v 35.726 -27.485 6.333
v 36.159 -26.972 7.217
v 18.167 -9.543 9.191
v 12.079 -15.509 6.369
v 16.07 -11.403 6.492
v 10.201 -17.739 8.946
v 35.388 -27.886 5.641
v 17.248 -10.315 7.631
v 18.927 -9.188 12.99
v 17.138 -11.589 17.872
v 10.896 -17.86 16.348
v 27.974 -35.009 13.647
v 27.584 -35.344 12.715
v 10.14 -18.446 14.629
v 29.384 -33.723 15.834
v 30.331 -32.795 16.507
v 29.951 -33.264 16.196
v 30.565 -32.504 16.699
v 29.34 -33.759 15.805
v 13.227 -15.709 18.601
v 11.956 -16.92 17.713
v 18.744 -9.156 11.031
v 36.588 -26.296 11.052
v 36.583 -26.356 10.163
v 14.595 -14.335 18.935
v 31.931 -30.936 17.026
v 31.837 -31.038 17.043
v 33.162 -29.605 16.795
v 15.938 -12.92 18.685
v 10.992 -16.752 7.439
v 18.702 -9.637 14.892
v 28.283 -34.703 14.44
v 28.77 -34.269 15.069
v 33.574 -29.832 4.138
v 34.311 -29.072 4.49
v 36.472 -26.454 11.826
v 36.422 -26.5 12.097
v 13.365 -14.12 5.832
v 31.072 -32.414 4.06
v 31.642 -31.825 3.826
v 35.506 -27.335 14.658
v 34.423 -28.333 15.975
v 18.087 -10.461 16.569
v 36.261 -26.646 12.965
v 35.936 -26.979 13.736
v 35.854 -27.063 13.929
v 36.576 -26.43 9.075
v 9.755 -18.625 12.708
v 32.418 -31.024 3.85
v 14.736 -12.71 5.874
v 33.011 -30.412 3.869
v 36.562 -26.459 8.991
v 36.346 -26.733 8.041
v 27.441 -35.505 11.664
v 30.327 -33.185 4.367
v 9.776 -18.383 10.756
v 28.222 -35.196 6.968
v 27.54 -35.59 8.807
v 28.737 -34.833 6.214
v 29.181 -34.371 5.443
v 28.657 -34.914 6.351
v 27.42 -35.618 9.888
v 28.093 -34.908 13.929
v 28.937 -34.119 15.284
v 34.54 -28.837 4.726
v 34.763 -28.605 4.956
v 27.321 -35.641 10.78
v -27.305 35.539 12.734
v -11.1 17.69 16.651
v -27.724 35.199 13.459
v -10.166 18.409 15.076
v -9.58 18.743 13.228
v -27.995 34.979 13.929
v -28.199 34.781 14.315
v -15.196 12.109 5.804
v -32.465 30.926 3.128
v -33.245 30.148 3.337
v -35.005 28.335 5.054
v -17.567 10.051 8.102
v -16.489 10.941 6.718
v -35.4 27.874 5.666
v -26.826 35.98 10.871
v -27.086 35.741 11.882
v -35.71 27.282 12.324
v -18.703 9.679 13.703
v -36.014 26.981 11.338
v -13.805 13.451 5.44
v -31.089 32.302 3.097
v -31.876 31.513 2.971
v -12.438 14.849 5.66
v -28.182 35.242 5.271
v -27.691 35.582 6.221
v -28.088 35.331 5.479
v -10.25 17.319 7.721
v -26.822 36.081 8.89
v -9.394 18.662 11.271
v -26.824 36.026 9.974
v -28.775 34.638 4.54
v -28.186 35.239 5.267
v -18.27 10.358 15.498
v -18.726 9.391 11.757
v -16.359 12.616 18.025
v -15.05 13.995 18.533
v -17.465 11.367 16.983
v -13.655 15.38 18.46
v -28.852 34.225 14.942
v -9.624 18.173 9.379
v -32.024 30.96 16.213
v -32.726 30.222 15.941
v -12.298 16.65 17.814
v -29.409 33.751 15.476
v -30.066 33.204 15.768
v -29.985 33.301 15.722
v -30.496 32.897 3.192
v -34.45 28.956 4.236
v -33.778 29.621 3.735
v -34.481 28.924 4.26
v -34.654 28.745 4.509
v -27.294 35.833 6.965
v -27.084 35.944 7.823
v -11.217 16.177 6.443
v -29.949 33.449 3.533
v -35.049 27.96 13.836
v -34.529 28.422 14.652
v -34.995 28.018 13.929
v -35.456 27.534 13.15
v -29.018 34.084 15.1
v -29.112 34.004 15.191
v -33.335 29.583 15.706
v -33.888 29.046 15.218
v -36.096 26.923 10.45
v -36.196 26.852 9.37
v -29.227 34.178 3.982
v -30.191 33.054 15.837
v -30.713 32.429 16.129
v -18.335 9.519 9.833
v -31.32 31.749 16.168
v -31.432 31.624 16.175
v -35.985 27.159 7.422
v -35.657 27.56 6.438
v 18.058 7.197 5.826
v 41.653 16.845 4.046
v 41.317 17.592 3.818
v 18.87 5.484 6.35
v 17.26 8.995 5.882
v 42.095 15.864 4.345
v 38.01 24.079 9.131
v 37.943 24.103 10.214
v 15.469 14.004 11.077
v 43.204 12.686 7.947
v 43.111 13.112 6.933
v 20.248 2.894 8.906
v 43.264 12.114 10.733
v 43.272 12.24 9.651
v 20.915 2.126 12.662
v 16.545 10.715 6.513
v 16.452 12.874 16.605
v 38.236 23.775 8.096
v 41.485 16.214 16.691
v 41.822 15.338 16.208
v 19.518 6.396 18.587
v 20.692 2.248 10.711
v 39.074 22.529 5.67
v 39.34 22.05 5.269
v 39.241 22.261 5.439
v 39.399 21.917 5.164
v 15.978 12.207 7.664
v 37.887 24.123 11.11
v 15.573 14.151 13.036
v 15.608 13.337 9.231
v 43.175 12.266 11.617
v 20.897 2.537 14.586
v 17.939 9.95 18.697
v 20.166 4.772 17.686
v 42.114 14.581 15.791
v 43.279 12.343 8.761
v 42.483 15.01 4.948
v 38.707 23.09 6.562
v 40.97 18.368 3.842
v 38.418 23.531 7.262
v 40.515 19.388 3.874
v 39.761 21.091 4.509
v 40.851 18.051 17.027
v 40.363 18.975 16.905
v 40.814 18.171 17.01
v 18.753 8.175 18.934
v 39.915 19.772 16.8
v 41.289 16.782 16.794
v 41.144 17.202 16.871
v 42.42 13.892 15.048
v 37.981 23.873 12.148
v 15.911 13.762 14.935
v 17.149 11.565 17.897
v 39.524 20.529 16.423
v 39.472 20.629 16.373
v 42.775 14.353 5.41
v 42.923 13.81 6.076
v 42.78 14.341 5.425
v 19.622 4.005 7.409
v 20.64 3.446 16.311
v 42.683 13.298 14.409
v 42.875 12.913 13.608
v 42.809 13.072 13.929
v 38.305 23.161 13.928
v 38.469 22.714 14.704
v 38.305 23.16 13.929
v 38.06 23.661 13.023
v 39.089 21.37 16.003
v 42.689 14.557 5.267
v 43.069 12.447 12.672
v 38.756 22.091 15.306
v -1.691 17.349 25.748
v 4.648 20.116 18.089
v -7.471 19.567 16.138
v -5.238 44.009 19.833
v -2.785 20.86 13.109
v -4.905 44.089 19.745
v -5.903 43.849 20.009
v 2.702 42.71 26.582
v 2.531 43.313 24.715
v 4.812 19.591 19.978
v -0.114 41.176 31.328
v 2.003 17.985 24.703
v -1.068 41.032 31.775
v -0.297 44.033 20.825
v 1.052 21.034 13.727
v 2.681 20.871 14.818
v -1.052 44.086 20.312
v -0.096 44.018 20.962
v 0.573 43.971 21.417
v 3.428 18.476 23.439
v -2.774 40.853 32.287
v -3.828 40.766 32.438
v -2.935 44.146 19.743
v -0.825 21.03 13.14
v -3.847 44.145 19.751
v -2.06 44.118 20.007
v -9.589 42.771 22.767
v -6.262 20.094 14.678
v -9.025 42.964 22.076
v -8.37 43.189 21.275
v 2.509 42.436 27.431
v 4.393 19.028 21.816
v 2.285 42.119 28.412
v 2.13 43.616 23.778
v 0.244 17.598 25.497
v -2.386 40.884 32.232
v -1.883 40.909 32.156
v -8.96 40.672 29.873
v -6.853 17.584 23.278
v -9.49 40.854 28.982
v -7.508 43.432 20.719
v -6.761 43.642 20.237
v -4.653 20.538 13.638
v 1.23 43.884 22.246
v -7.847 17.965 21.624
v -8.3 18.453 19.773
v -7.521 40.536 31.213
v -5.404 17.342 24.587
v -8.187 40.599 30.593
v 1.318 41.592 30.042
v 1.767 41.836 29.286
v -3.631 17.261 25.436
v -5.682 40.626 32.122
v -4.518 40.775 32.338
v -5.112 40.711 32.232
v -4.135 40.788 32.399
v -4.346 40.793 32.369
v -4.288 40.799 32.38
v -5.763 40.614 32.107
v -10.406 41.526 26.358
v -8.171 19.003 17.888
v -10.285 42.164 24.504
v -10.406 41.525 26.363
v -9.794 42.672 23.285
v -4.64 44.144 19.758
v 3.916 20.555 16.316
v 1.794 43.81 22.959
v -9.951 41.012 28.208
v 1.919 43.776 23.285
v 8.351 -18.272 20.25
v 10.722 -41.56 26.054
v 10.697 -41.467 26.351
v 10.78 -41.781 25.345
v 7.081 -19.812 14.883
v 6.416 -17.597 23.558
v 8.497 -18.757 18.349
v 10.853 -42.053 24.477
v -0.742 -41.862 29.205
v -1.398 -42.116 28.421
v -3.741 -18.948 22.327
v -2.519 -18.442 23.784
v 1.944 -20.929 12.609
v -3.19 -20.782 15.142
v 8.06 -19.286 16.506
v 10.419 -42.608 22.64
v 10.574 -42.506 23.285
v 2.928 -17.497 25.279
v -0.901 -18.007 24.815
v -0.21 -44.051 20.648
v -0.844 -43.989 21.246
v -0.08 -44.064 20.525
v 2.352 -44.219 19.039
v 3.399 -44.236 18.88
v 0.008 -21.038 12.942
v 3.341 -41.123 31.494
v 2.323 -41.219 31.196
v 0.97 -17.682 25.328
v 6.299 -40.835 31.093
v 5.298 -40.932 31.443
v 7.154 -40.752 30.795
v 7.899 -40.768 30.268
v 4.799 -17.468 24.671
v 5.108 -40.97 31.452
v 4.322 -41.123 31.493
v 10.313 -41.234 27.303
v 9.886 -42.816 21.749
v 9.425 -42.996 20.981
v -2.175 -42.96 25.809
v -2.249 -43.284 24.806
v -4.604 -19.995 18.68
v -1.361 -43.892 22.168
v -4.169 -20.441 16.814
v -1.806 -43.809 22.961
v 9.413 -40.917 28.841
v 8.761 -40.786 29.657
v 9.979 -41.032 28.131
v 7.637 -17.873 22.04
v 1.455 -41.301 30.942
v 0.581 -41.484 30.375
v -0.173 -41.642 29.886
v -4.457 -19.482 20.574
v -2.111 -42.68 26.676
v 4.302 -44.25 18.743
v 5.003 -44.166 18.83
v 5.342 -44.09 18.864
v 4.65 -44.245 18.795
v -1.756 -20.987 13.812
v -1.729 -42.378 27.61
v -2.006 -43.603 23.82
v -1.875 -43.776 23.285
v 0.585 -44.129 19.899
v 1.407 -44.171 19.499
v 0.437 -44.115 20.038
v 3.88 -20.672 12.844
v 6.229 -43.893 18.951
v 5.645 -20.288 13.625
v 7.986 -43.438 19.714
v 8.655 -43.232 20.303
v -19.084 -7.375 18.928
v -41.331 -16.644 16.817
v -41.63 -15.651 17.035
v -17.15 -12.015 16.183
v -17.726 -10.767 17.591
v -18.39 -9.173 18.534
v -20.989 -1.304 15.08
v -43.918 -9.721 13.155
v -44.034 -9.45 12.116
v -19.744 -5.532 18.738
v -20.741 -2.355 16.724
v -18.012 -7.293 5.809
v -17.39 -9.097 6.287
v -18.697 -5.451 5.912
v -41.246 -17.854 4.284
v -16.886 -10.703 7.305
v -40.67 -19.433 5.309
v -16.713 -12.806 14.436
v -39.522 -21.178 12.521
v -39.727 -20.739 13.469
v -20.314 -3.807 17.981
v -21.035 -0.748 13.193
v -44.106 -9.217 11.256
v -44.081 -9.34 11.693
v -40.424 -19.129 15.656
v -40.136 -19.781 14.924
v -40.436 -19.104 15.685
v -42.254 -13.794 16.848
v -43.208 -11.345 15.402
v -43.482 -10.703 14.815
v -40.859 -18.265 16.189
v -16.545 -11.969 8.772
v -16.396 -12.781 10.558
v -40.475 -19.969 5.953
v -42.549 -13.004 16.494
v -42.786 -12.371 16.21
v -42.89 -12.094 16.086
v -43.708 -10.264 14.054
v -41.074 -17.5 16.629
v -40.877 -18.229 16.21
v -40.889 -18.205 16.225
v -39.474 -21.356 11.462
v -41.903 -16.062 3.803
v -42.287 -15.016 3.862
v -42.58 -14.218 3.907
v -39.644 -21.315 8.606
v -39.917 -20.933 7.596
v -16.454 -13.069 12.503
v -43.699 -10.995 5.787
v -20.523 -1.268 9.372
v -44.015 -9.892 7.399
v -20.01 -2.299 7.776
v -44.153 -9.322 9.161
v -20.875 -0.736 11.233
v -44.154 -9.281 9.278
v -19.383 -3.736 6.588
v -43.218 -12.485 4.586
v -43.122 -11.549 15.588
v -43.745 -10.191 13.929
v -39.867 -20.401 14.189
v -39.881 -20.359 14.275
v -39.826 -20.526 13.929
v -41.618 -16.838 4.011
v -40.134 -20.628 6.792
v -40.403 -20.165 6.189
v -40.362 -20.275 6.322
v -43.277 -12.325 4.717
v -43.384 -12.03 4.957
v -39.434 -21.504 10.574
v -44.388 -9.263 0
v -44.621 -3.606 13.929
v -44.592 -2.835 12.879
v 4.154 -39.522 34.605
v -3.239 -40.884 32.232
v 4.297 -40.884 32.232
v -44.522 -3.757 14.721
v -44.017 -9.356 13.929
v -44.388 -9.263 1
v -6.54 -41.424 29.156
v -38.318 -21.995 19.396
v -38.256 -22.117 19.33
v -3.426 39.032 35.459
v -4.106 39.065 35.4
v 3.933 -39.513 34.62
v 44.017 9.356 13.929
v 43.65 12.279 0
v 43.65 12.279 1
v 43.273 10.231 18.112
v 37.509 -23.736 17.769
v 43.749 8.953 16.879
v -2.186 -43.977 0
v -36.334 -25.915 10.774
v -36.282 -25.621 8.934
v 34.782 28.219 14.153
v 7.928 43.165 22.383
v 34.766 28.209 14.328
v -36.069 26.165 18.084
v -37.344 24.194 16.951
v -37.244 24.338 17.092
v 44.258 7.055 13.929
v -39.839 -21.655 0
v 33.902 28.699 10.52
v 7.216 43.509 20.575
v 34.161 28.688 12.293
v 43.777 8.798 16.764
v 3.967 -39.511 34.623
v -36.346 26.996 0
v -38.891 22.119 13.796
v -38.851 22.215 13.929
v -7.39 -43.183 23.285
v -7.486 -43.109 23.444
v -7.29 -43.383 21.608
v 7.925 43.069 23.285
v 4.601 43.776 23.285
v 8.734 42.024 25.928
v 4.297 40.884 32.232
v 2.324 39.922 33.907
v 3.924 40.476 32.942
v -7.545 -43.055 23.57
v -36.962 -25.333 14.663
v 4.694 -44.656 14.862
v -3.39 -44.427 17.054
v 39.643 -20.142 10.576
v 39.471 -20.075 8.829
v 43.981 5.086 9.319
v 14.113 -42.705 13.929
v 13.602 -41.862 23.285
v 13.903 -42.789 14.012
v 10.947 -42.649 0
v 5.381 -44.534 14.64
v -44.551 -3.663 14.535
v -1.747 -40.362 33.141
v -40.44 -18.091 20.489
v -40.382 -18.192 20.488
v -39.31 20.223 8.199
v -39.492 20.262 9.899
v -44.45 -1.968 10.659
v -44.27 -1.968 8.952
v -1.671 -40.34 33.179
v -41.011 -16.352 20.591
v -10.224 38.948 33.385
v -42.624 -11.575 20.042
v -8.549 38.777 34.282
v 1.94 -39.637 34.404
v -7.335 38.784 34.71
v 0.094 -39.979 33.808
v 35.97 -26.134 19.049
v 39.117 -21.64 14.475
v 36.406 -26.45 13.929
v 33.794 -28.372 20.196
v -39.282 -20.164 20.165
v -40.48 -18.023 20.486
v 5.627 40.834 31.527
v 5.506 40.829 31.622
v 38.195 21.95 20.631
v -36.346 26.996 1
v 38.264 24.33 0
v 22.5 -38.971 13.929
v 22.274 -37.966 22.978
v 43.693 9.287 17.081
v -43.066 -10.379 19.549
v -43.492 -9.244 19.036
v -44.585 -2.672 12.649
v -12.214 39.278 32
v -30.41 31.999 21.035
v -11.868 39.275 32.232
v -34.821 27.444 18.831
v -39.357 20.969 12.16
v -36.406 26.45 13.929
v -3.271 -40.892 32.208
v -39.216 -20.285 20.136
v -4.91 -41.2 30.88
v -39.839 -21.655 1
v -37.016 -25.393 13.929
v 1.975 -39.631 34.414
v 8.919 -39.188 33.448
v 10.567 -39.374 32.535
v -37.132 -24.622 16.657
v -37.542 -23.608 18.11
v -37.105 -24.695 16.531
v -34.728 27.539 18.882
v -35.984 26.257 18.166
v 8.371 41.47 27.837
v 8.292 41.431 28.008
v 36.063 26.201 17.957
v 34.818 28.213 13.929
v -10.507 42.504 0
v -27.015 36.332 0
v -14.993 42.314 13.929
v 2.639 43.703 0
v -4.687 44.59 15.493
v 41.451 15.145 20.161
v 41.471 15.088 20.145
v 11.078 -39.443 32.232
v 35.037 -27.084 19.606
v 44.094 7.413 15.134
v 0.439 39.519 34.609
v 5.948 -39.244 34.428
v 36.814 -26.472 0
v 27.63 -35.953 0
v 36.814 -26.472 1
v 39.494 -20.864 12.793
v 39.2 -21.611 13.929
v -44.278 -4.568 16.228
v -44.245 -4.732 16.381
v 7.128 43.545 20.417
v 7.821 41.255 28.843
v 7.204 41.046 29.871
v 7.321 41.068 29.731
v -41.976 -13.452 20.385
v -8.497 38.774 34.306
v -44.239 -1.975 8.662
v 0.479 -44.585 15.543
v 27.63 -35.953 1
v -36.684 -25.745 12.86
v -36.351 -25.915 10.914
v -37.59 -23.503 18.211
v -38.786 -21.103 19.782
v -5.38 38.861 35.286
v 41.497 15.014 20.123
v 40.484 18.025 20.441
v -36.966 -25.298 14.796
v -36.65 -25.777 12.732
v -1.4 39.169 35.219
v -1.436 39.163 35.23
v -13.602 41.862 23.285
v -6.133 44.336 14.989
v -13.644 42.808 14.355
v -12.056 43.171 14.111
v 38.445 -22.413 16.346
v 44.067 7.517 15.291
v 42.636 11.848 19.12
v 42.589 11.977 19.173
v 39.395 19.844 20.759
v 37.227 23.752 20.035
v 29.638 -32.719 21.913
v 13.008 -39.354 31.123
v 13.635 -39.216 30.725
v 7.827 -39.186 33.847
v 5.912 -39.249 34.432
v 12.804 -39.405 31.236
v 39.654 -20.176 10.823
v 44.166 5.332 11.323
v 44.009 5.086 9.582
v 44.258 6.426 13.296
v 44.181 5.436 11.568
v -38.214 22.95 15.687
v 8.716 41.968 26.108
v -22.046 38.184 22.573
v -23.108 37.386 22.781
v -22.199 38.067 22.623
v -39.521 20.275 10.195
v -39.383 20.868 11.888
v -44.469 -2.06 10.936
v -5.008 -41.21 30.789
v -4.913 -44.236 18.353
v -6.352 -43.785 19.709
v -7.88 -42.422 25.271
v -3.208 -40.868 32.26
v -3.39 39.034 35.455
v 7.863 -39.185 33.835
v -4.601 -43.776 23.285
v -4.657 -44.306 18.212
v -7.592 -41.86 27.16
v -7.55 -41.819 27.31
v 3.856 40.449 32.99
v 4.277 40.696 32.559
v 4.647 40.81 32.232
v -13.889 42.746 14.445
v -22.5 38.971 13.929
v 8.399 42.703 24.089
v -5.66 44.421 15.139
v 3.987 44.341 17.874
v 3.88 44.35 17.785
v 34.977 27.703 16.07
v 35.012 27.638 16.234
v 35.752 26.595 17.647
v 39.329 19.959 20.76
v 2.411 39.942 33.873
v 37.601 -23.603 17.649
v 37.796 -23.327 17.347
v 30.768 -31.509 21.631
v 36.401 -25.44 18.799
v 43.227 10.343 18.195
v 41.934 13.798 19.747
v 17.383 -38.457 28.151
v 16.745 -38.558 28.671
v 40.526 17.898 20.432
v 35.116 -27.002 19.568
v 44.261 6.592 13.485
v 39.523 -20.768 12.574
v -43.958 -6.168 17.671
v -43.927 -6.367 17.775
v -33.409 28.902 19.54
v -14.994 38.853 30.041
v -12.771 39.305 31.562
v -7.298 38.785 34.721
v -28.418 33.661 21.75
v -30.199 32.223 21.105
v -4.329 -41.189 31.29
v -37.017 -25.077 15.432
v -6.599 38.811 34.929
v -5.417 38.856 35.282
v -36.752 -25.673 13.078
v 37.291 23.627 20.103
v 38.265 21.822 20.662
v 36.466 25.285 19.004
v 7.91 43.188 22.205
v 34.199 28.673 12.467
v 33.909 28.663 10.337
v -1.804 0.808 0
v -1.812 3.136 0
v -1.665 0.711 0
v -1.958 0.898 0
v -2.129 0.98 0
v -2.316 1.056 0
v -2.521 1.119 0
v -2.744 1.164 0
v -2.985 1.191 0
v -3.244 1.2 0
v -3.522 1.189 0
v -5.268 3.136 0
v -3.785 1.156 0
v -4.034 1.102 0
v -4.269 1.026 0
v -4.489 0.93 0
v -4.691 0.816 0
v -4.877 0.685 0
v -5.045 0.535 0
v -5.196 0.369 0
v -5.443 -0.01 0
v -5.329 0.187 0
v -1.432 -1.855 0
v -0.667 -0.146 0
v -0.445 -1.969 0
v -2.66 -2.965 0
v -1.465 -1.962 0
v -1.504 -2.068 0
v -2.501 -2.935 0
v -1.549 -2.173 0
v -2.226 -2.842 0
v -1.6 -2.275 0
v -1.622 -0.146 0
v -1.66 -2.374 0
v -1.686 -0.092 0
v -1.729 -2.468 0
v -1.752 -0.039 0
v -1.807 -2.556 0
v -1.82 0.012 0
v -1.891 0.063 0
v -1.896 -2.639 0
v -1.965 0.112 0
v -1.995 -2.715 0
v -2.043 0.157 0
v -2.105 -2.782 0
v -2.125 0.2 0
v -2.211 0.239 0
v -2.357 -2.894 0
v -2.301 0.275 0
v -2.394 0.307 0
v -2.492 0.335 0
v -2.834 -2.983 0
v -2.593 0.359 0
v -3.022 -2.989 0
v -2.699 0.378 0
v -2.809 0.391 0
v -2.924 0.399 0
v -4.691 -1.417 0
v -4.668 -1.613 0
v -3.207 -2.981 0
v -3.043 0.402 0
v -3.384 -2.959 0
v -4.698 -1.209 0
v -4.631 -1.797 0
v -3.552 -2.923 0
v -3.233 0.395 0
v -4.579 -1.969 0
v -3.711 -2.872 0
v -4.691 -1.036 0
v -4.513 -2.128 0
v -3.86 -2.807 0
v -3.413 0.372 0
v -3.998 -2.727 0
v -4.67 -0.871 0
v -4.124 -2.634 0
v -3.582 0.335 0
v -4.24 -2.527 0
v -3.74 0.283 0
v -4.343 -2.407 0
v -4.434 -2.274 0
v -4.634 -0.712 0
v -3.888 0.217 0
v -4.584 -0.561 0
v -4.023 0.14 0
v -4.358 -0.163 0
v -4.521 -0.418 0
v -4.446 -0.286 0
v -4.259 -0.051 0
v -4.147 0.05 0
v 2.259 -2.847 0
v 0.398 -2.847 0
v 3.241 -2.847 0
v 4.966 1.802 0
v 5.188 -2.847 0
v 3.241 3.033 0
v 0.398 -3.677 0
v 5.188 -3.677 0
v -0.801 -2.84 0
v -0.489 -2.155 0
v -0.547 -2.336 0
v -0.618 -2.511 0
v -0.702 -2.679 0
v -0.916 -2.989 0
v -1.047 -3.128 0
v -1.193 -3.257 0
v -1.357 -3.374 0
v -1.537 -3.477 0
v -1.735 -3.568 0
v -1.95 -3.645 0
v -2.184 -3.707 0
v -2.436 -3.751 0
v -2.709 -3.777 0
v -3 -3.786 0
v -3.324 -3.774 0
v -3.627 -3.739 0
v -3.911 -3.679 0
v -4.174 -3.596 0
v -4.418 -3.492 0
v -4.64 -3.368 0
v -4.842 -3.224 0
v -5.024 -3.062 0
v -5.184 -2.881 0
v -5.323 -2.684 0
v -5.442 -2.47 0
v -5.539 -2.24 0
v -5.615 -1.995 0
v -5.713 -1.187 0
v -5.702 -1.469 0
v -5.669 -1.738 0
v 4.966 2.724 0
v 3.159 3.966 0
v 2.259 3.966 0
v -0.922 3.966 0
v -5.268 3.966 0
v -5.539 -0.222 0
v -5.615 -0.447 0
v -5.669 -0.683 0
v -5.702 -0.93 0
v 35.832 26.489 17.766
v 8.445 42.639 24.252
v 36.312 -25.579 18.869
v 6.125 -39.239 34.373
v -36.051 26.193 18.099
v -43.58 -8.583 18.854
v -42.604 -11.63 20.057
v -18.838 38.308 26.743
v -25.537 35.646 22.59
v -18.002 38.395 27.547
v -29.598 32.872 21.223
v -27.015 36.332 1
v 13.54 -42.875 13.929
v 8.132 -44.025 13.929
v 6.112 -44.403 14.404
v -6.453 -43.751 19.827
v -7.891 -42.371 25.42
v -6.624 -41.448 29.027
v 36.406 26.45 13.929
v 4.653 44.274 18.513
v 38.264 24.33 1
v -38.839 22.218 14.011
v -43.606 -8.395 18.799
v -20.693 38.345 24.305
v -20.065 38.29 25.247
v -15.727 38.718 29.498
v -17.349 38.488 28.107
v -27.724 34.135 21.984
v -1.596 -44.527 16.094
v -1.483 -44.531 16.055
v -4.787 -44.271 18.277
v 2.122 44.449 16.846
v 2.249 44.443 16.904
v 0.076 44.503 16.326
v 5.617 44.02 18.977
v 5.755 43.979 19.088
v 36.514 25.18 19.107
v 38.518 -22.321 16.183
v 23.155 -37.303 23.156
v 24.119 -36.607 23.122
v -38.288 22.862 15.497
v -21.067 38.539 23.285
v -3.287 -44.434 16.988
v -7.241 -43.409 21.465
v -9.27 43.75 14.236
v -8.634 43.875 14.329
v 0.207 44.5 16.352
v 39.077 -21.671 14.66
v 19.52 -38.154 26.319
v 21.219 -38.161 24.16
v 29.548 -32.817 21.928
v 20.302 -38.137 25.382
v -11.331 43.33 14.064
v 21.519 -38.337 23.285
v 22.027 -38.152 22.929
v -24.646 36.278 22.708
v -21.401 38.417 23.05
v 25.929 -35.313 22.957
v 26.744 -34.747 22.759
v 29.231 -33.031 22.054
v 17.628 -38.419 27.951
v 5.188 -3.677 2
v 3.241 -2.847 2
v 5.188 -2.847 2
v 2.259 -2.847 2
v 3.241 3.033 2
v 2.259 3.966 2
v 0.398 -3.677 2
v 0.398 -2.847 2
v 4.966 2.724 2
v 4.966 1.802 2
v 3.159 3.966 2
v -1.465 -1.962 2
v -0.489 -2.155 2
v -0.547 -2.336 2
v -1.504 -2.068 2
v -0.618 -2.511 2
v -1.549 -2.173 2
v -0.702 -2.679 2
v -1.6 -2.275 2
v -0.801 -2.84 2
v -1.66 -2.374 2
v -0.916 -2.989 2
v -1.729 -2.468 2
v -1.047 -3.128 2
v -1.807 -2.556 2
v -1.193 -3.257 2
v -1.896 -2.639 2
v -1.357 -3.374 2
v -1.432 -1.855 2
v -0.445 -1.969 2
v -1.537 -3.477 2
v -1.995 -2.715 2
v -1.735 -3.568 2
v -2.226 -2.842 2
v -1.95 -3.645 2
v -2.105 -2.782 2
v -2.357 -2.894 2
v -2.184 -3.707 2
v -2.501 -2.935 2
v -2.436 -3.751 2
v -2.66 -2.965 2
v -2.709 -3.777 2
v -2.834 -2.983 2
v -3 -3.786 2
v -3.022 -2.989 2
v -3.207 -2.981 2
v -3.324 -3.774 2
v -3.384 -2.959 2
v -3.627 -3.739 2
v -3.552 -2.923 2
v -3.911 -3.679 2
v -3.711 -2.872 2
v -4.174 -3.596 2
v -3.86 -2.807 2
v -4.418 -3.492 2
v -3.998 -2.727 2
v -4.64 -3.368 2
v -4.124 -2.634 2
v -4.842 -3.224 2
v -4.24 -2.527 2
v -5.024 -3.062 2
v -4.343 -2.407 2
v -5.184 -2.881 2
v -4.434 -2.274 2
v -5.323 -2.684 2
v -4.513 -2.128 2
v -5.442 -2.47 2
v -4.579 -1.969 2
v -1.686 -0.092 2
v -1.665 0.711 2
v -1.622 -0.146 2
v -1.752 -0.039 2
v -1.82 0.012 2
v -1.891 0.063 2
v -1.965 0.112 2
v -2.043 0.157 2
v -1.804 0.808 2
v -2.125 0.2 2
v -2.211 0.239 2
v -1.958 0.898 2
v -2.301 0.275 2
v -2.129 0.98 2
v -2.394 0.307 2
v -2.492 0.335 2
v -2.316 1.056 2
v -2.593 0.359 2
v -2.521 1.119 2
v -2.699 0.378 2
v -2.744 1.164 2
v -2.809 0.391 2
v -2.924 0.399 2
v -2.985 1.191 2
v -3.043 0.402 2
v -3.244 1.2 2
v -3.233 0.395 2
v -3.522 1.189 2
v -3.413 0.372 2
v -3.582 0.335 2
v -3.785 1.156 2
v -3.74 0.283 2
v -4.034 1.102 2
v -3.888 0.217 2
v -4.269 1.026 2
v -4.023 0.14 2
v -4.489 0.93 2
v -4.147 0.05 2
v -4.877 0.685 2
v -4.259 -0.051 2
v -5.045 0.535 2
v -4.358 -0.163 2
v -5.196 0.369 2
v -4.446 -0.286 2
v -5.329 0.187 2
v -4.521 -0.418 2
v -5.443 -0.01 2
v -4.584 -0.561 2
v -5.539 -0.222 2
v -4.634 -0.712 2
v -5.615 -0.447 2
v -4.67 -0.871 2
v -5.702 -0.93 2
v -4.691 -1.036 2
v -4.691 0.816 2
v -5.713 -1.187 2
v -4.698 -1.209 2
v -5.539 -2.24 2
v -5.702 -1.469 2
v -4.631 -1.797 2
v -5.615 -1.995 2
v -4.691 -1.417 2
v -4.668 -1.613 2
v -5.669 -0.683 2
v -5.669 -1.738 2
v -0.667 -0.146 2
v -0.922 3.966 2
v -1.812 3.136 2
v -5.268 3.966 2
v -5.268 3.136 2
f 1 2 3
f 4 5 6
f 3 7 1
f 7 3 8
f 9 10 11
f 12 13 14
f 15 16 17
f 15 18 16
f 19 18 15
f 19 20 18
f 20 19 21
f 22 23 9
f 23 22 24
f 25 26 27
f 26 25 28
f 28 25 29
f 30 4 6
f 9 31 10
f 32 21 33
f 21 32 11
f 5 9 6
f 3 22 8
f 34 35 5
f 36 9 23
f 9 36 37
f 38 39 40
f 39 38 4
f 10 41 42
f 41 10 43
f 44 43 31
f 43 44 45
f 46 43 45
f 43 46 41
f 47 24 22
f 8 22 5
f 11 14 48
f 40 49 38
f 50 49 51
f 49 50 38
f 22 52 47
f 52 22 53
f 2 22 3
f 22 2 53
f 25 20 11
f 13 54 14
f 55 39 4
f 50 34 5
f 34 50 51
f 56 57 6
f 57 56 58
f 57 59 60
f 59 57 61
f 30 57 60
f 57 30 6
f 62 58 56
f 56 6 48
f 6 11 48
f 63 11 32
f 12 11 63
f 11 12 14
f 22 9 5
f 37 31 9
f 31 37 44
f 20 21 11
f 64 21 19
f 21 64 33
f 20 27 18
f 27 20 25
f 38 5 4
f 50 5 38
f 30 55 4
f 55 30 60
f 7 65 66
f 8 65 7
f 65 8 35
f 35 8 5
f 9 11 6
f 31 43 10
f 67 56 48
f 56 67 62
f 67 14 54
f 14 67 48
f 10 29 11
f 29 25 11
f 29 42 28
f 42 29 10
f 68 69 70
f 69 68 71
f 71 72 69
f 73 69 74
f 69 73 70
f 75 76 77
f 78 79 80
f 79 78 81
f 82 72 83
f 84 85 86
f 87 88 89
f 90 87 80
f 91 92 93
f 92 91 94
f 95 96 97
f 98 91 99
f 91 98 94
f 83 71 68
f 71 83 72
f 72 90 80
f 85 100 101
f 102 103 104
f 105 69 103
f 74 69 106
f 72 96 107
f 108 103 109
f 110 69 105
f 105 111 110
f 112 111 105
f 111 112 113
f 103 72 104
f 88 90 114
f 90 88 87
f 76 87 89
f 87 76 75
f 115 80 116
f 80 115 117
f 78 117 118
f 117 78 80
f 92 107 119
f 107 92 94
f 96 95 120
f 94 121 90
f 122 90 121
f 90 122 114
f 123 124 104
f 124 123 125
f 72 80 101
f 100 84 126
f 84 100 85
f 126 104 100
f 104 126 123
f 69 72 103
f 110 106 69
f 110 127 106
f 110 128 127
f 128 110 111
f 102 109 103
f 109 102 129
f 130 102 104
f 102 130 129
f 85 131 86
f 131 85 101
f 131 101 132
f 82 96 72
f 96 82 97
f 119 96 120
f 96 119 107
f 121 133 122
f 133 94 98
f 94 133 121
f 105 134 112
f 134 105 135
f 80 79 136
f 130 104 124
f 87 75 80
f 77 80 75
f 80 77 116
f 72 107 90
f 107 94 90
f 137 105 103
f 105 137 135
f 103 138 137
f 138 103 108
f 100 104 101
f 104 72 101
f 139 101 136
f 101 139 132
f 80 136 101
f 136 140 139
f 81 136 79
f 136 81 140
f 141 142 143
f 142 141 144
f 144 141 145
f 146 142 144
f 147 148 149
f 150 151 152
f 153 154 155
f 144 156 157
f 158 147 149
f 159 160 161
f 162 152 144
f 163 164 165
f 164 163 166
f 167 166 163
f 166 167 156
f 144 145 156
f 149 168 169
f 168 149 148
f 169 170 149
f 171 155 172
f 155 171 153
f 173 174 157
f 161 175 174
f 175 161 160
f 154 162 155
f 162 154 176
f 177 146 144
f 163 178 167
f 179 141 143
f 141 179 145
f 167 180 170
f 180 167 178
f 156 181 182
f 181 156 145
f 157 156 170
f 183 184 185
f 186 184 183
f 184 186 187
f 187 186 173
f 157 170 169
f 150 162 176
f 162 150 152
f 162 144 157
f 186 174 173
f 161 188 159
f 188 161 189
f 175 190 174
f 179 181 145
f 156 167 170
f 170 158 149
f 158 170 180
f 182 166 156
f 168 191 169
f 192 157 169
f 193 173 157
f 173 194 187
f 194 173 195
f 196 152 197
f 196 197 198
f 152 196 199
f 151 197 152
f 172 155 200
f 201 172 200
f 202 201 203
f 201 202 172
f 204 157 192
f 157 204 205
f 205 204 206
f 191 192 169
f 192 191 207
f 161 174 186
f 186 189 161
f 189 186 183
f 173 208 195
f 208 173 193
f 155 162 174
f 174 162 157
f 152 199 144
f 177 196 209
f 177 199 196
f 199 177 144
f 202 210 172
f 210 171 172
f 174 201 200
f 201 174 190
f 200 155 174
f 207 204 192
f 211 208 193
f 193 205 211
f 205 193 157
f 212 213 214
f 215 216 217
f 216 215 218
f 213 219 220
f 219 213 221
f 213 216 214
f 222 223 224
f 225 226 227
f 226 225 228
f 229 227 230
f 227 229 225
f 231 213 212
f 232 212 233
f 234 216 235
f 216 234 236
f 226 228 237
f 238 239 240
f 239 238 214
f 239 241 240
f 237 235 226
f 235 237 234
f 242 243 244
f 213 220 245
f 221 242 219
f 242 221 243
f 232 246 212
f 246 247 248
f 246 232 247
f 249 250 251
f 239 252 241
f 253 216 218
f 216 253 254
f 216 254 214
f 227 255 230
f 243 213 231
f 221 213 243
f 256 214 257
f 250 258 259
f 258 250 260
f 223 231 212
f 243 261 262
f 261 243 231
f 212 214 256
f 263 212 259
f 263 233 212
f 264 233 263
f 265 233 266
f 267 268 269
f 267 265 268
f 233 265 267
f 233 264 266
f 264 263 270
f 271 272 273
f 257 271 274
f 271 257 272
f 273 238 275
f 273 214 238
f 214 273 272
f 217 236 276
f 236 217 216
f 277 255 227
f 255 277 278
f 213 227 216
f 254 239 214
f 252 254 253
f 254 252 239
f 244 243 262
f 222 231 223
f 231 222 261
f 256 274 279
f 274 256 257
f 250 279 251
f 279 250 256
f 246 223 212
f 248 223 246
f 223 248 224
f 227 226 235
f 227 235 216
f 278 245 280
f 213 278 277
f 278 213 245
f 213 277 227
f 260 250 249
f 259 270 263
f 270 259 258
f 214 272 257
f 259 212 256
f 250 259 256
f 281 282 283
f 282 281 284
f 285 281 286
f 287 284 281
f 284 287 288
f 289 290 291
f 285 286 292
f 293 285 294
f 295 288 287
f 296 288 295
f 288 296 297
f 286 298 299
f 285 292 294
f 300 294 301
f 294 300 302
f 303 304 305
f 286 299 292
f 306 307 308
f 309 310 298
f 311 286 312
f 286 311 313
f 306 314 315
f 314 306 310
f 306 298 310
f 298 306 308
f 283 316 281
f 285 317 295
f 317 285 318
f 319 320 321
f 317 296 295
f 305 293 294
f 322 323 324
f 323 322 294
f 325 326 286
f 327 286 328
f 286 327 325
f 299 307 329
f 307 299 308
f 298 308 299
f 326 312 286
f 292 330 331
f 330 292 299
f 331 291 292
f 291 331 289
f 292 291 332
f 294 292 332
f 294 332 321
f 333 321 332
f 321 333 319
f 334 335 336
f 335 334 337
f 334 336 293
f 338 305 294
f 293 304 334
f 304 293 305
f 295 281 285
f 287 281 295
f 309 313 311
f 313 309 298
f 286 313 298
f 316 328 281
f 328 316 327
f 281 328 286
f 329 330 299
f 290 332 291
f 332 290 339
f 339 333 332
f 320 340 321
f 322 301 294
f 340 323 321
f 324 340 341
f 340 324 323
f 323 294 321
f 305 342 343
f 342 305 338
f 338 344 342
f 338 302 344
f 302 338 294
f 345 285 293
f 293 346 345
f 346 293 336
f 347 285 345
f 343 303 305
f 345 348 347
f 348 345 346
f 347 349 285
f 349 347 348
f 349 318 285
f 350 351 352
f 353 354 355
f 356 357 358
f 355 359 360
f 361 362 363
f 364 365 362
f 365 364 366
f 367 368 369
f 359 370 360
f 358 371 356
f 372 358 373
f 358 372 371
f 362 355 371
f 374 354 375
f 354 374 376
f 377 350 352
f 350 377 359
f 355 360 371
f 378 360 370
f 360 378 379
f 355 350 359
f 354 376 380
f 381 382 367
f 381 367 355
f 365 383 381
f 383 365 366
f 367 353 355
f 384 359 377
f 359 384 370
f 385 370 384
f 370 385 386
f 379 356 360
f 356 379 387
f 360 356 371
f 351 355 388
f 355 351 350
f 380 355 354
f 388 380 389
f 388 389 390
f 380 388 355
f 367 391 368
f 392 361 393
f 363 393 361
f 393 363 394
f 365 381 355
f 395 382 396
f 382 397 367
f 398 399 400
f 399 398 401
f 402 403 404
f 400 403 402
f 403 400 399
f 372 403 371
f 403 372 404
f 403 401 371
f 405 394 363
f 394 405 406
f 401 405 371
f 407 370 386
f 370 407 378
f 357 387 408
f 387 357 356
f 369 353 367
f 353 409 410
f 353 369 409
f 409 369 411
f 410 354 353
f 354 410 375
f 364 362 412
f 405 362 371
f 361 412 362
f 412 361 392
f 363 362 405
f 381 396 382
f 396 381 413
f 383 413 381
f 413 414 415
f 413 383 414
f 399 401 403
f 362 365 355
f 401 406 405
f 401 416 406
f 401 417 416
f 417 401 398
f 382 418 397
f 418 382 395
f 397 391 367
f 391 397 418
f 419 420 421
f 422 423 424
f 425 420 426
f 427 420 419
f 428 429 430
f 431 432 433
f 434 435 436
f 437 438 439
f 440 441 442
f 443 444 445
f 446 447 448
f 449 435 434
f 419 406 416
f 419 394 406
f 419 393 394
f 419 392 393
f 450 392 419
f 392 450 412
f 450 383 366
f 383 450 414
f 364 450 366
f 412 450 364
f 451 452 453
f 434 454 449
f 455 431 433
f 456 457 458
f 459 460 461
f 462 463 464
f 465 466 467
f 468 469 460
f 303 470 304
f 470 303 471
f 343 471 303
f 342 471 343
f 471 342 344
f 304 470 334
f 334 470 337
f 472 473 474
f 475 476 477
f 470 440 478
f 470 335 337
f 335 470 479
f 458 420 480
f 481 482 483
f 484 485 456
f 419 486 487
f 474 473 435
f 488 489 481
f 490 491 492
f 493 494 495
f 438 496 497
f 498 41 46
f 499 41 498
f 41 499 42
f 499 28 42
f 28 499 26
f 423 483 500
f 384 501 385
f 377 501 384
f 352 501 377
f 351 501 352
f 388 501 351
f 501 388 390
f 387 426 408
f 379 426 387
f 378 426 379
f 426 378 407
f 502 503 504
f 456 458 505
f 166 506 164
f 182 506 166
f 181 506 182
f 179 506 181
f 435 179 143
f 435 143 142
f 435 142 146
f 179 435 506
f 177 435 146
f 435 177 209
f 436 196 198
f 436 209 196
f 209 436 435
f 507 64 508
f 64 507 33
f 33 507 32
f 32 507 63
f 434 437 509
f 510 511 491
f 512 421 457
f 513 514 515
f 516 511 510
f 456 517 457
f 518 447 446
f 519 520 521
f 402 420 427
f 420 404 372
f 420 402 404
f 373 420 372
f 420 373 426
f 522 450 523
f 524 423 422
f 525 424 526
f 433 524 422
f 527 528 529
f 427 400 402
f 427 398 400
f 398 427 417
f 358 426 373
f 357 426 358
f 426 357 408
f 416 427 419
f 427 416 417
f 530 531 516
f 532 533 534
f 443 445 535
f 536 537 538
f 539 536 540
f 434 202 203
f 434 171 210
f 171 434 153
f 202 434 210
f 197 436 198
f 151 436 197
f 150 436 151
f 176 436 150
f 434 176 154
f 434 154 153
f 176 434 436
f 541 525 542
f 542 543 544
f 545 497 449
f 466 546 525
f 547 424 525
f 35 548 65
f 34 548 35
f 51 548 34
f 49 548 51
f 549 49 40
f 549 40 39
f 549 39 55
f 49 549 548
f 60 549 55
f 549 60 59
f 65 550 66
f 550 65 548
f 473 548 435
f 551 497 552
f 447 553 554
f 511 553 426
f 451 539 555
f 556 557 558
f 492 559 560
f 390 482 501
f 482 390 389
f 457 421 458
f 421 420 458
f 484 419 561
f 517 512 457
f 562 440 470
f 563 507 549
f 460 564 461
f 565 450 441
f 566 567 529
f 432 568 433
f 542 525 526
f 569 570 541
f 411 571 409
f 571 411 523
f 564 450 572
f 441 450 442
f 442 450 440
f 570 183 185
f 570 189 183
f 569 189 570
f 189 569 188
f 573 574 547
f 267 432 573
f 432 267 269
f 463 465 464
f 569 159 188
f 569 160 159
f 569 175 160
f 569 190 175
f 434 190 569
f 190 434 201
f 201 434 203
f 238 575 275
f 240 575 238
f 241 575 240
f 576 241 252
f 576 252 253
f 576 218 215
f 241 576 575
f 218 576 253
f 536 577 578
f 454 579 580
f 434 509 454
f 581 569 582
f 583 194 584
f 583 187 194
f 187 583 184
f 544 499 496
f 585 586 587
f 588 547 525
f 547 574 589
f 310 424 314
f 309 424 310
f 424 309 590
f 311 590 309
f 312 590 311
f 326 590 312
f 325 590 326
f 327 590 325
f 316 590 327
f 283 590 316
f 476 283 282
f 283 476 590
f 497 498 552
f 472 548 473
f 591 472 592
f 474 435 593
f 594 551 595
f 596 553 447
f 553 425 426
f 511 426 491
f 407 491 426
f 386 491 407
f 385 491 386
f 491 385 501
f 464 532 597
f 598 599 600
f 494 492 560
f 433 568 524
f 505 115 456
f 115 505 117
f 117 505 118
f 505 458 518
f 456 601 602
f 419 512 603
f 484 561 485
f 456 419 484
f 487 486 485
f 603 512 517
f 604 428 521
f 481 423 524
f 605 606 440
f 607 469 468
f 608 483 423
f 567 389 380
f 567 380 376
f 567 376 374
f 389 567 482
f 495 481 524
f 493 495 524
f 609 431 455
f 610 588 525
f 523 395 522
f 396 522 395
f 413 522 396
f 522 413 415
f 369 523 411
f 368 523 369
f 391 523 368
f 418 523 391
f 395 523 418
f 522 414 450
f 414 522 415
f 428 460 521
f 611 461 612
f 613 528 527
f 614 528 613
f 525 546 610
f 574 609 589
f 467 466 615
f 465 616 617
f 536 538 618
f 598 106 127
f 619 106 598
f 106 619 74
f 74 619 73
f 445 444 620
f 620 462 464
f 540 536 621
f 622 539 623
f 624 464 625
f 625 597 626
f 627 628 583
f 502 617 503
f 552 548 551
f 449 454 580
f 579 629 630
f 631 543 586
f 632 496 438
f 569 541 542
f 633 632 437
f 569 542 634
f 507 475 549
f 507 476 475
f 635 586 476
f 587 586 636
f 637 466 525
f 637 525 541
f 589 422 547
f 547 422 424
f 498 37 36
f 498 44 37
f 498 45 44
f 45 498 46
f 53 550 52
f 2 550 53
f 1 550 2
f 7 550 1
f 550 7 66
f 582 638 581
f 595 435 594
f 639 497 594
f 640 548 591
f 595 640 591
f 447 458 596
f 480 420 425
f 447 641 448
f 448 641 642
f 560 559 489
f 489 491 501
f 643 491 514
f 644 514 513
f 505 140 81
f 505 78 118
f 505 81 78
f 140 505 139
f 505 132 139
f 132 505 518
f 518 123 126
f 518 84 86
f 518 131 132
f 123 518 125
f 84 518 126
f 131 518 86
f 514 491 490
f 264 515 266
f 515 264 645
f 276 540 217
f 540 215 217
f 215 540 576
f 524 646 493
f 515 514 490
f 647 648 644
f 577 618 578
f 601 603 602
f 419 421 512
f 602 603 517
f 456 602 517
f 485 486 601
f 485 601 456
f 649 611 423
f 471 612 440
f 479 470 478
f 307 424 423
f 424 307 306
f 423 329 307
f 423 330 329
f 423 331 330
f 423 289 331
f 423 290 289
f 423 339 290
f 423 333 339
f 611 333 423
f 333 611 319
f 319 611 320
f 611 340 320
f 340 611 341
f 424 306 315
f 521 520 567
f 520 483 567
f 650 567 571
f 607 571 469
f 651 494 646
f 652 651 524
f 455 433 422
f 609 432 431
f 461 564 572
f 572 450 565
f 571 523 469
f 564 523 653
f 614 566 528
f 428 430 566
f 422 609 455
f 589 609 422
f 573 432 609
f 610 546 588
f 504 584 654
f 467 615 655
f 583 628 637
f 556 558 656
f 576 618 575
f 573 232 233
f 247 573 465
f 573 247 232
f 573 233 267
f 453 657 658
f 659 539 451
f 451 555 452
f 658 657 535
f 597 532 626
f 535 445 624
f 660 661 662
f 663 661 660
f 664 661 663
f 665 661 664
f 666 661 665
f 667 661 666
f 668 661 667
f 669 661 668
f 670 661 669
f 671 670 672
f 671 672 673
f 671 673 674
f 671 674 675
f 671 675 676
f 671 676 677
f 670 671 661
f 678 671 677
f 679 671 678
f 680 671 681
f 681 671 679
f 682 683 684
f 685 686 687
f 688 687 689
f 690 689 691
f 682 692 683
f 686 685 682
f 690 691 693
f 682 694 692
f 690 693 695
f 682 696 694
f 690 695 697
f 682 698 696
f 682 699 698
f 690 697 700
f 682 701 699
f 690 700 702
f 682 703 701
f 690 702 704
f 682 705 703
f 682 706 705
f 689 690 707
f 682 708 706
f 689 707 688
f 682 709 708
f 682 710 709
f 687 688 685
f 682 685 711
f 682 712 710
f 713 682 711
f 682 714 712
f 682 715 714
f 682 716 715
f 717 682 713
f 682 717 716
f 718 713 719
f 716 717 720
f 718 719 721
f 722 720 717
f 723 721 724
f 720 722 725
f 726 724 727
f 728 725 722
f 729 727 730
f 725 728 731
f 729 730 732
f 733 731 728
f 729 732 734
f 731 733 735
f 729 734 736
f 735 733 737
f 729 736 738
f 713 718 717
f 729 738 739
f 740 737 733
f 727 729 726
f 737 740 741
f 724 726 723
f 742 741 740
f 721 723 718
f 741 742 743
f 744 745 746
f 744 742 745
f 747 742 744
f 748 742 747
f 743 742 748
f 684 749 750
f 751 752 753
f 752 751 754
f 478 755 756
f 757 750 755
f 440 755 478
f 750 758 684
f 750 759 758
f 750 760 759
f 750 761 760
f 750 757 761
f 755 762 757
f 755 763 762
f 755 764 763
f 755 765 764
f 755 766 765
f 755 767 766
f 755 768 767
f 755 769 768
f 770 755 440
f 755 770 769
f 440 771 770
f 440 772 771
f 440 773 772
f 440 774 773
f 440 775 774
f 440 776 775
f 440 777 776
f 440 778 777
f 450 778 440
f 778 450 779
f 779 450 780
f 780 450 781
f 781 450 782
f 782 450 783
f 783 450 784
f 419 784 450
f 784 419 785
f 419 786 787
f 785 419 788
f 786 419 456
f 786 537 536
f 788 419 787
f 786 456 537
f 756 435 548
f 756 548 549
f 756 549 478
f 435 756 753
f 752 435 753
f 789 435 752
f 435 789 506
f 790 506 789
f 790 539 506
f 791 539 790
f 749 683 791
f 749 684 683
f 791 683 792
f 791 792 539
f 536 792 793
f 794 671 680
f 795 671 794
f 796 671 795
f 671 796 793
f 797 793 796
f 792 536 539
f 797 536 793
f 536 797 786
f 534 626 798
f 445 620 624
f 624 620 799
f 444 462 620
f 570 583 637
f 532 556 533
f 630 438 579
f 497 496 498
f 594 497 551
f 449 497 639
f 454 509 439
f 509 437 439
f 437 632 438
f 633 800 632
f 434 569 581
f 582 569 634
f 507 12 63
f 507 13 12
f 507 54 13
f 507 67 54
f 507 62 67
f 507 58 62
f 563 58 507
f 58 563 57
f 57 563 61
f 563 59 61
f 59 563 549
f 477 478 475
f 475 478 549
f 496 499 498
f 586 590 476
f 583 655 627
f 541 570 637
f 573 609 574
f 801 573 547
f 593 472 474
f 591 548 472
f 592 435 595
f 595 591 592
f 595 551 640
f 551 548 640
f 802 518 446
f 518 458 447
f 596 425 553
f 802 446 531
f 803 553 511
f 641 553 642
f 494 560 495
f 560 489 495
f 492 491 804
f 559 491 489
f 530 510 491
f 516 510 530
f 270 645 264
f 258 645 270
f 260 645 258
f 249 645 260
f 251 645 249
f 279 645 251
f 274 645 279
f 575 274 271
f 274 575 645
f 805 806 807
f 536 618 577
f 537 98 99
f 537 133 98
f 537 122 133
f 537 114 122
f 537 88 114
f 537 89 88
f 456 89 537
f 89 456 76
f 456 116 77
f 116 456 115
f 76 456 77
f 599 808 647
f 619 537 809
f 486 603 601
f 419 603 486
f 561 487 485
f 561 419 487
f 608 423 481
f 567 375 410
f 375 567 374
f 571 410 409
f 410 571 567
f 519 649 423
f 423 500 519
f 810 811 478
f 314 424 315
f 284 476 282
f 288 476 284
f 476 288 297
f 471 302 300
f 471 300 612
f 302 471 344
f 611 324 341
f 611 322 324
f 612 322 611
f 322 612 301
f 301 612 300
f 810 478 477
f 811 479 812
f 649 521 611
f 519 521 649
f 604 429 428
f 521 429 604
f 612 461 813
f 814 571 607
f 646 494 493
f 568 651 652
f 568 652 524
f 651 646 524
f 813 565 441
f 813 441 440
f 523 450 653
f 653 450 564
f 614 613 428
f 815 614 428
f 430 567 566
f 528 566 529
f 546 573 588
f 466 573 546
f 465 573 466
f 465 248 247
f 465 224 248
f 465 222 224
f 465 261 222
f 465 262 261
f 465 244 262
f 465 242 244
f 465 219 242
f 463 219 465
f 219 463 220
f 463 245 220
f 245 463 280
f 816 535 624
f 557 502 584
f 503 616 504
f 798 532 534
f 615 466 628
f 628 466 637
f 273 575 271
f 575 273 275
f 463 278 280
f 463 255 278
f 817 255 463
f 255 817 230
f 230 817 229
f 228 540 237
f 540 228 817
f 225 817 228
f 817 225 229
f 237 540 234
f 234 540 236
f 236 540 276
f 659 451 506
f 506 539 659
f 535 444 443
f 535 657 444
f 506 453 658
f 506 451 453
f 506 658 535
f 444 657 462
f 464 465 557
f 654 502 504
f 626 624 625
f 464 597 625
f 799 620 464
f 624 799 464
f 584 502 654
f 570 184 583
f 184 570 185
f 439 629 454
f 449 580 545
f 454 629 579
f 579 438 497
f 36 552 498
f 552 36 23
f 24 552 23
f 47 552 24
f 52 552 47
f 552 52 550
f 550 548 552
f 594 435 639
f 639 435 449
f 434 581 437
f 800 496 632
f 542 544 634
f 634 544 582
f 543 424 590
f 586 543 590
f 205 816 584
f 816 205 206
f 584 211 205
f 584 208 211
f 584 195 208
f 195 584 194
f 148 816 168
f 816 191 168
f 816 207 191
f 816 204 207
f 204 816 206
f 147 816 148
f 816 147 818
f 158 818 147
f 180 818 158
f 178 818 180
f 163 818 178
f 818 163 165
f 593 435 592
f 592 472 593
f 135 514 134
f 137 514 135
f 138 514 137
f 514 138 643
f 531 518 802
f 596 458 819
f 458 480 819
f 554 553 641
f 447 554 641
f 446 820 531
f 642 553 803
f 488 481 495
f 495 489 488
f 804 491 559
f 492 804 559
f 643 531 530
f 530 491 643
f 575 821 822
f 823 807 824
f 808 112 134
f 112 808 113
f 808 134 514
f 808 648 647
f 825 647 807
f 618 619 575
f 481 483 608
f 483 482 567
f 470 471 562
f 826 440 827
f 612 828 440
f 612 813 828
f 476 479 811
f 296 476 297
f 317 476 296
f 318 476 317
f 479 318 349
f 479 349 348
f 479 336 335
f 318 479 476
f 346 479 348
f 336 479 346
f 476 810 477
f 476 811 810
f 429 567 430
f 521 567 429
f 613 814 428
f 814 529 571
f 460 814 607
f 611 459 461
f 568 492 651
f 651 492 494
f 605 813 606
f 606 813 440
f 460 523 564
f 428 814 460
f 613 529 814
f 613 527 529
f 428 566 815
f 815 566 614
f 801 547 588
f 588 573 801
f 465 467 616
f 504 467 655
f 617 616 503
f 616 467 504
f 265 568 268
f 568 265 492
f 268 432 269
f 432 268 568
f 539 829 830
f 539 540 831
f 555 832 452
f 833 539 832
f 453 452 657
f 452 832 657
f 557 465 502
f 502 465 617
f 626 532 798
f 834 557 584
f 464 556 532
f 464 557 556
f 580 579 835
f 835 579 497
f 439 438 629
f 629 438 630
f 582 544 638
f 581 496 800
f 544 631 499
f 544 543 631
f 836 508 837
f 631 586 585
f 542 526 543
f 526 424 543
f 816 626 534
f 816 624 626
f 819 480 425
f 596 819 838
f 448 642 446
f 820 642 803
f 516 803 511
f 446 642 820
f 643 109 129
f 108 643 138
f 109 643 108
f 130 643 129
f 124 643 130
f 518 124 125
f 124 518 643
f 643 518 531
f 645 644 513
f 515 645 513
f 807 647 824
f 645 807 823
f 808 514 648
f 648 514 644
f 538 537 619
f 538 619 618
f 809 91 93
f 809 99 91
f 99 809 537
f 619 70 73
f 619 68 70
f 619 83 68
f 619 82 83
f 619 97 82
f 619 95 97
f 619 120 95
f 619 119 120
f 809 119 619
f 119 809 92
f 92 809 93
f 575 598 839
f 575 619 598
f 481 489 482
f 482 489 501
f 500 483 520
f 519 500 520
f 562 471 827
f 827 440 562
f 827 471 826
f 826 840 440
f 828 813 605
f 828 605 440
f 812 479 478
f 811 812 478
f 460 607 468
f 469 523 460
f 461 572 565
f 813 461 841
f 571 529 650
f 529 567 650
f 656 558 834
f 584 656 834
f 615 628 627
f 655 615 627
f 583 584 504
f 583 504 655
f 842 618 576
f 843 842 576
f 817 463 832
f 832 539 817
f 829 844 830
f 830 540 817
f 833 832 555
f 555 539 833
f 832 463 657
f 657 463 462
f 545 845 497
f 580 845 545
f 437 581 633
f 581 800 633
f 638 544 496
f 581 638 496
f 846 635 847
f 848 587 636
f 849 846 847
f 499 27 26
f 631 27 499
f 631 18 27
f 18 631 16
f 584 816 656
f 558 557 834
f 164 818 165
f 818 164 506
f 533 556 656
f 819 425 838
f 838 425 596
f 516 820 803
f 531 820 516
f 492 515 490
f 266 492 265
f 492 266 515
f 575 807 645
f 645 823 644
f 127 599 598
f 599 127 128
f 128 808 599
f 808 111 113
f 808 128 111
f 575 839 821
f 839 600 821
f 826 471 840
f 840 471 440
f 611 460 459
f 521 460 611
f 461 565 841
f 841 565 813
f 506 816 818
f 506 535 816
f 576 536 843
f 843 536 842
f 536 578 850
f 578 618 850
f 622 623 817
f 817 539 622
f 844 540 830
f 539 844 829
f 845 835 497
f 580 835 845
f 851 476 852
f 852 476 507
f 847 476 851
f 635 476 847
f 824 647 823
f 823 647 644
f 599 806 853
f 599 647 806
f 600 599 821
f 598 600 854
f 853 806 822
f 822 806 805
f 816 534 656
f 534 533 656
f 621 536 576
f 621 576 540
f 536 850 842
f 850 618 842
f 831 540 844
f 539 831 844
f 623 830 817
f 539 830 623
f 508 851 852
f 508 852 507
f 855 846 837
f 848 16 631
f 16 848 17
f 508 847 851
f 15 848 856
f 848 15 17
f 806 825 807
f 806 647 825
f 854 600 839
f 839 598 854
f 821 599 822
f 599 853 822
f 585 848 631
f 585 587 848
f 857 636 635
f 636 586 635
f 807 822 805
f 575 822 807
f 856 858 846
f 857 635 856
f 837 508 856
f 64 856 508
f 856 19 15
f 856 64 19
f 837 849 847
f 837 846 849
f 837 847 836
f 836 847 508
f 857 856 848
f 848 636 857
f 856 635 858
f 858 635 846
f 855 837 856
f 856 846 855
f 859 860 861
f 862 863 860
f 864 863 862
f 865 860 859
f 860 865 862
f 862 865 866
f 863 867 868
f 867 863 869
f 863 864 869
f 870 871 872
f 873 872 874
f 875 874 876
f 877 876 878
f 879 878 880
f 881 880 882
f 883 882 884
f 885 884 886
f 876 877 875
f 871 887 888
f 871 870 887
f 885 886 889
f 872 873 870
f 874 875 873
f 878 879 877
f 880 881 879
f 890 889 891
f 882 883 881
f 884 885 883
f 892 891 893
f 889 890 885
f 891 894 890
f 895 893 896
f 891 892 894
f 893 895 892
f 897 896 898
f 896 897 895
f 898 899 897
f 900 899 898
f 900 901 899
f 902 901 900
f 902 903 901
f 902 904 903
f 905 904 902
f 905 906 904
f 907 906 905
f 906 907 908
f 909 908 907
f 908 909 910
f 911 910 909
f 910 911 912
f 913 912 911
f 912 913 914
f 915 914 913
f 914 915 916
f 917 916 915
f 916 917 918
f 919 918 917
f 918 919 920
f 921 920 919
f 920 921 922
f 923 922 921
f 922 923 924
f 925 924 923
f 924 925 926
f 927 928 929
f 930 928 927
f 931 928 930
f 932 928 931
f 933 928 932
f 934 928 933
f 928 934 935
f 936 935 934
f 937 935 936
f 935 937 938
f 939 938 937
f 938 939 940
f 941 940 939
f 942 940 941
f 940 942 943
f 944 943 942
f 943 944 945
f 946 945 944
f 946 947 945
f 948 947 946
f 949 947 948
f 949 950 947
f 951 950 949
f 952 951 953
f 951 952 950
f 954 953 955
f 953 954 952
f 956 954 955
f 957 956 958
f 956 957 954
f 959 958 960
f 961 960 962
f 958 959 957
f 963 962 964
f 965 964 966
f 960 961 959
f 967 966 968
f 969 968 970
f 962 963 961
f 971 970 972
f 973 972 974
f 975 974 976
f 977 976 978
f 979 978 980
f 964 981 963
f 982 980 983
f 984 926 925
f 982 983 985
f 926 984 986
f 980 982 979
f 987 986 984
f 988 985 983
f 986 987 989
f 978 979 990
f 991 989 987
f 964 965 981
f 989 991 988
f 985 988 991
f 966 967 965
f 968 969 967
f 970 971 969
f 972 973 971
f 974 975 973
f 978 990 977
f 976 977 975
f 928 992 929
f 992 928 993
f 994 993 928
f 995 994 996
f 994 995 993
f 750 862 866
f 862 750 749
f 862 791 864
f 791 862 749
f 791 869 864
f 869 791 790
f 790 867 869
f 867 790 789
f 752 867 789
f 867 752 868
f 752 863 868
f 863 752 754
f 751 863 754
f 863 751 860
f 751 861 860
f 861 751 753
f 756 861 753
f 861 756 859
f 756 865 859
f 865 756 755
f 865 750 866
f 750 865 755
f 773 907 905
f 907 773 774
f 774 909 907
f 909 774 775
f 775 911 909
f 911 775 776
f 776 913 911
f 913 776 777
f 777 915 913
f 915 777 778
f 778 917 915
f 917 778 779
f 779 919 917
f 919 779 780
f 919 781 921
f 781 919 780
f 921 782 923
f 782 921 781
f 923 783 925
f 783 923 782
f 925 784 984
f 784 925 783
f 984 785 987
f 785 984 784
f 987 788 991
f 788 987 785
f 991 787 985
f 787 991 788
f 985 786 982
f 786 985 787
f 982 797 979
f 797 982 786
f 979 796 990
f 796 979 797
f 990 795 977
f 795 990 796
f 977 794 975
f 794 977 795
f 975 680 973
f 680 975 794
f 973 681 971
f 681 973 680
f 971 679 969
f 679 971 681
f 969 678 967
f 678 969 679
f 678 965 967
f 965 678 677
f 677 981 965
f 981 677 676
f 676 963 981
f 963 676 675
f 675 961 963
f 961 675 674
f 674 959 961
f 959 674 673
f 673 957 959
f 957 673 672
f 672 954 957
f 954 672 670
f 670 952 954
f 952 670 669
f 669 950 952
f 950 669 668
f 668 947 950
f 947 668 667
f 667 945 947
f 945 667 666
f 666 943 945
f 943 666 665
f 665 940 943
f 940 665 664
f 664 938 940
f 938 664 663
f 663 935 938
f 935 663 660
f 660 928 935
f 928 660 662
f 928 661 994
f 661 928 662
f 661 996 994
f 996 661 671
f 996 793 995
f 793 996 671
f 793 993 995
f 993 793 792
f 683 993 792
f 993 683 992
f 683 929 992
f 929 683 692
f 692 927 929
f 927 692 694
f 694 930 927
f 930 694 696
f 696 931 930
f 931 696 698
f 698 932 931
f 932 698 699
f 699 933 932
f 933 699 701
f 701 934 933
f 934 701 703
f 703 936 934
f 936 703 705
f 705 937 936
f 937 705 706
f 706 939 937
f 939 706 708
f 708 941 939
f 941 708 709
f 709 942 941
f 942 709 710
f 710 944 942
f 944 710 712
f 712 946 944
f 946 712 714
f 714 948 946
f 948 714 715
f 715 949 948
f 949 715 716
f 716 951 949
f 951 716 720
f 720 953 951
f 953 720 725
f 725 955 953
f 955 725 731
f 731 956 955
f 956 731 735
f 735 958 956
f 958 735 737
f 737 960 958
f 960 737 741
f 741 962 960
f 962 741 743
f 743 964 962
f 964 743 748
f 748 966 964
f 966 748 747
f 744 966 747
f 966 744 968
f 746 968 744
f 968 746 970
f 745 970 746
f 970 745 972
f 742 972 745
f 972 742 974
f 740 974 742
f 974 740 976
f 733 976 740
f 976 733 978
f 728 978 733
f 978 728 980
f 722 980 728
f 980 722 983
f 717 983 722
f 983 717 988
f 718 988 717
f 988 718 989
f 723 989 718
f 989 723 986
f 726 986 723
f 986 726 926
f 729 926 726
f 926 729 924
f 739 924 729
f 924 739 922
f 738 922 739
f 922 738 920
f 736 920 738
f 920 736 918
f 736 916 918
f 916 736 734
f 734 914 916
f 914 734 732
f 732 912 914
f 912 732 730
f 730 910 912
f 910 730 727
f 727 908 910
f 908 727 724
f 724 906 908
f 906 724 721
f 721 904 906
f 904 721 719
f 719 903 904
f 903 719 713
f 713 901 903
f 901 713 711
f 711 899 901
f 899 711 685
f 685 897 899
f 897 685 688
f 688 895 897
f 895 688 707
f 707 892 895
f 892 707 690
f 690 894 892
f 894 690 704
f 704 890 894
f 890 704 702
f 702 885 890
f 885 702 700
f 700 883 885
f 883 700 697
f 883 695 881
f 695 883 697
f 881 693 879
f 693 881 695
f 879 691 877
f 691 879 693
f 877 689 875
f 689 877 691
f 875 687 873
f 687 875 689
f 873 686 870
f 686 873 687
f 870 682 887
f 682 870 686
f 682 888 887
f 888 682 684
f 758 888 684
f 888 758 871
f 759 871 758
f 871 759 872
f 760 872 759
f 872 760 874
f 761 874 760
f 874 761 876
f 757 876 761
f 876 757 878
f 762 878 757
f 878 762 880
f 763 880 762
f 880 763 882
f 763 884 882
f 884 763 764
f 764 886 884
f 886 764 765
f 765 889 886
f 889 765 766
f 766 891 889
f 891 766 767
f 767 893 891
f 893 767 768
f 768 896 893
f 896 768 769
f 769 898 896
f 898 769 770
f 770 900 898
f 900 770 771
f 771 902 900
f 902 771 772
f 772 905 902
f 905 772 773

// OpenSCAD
difference() {
	difference() {
		difference() {
			hull() {
				union() {
					union() {
						rotate(a = -44.0885568165, v = [0, 0, 1]) {
							translate(v = [0, -6.6000000000, 0]) {
								cube(size = [44.8608913384, 13.2000000000, 1]);
							}
						}
						rotate(a = 135.0152083052, v = [0, 0, 1]) {
							translate(v = [0, -6.6000000000, 0]) {
								cube(size = [44.7913225372, 13.2000000000, 1]);
							}
						}
						rotate(a = 24.0809680797, v = [0, 0, 1]) {
							translate(v = [0, -6.6000000000, 0]) {
								cube(size = [44.8608917975, 13.2000000000, 1]);
							}
						}
						rotate(a = 95.2146620758, v = [0, 0, 1]) {
							translate(v = [0, -6.6000000000, 0]) {
								cube(size = [43.2827500793, 13.2000000000, 1]);
							}
						}
						rotate(a = -84.2254760666, v = [0, 0, 1]) {
							translate(v = [0, -6.6000000000, 0]) {
								cube(size = [43.5340646969, 13.2000000000, 1]);
							}
						}
						rotate(a = -159.8428584581, v = [0, 0, 1]) {
							translate(v = [0, -6.6000000000, 0]) {
								cube(size = [44.8608908767, 13.2000000000, 1]);
							}
						}
					}
					translate(v = [0, 0, 13.9286747818]) {
						intersection() {
							hull() {
								rotate(a = 94.5063018240, v = [0.6936184448, 0.7160449746, -0.0000014097]) {
									cylinder(h = 45, r = 9.6000000000);
								}
								rotate(a = 95.5199751218, v = [-0.7036409821, -0.7040144307, 0.0000014077]) {
									cylinder(h = 45, r = 9.6000000000);
								}
								rotate(a = 94.5062199855, v = [-0.4067659687, 0.9101475830, -0.0000005034]) {
									cylinder(h = 45, r = 9.6000000000);
								}
								rotate(a = 74.1203690177, v = [-0.9578577323, -0.0874193342, 0.0000010453]) {
									cylinder(h = 45, r = 9.6000000000);
								}
								rotate(a = 75.3352946970, v = [0.9625147646, 0.0973360357, -0.0000010599]) {
									cylinder(h = 45, r = 9.6000000000);
								}
								rotate(a = 94.5063841252, v = [0.3435307565, -0.9358489979, 0.0000005923]) {
									cylinder(h = 45, r = 9.6000000000);
								}
							}
							sphere(r = 45);
						}
					}
				}
			}
			translate(v = [0, 0, 13.9286747818]) {
				rotate(a = 94.5063018240, v = [0.6936184448, 0.7160449746, -0.0000014097]) {
					translate(v = [0, 0, 20]) {
						cylinder(h = 45, r = 6.6000000000);
					}
				}
				rotate(a = 95.5199751218, v = [-0.7036409821, -0.7040144307, 0.0000014077]) {
					translate(v = [0, 0, 20]) {
						cylinder(h = 45, r = 6.6000000000);
					}
				}
				rotate(a = 94.5062199855, v = [-0.4067659687, 0.9101475830, -0.0000005034]) {
					translate(v = [0, 0, 20]) {
						cylinder(h = 45, r = 6.6000000000);
					}
				}
				rotate(a = 74.1203690177, v = [-0.9578577323, -0.0874193342, 0.0000010453]) {
					translate(v = [0, 0, 20]) {
						cylinder(h = 45, r = 6.6000000000);
					}
				}
				rotate(a = 75.3352946970, v = [0.9625147646, 0.0973360357, -0.0000010599]) {
					translate(v = [0, 0, 20]) {
						cylinder(h = 45, r = 6.6000000000);
					}
				}
				rotate(a = 94.5063841252, v = [0.3435307565, -0.9358489979, 0.0000005923]) {
					translate(v = [0, 0, 20]) {
						cylinder(h = 45, r = 6.6000000000);
					}
				}
			}
		}
		translate(v = [-100, -100, -100]) {
			cube(size = [200, 200, 100]);
		}
	}
	translate(v = [0, 0, 2]) {
		rotate(a = 180, v = [0, 1, 0]) {
			linear_extrude(height = 3) {
				text(halign = "center", size = 8, text = "15", valign = "center");
			}
		}
	}
}
